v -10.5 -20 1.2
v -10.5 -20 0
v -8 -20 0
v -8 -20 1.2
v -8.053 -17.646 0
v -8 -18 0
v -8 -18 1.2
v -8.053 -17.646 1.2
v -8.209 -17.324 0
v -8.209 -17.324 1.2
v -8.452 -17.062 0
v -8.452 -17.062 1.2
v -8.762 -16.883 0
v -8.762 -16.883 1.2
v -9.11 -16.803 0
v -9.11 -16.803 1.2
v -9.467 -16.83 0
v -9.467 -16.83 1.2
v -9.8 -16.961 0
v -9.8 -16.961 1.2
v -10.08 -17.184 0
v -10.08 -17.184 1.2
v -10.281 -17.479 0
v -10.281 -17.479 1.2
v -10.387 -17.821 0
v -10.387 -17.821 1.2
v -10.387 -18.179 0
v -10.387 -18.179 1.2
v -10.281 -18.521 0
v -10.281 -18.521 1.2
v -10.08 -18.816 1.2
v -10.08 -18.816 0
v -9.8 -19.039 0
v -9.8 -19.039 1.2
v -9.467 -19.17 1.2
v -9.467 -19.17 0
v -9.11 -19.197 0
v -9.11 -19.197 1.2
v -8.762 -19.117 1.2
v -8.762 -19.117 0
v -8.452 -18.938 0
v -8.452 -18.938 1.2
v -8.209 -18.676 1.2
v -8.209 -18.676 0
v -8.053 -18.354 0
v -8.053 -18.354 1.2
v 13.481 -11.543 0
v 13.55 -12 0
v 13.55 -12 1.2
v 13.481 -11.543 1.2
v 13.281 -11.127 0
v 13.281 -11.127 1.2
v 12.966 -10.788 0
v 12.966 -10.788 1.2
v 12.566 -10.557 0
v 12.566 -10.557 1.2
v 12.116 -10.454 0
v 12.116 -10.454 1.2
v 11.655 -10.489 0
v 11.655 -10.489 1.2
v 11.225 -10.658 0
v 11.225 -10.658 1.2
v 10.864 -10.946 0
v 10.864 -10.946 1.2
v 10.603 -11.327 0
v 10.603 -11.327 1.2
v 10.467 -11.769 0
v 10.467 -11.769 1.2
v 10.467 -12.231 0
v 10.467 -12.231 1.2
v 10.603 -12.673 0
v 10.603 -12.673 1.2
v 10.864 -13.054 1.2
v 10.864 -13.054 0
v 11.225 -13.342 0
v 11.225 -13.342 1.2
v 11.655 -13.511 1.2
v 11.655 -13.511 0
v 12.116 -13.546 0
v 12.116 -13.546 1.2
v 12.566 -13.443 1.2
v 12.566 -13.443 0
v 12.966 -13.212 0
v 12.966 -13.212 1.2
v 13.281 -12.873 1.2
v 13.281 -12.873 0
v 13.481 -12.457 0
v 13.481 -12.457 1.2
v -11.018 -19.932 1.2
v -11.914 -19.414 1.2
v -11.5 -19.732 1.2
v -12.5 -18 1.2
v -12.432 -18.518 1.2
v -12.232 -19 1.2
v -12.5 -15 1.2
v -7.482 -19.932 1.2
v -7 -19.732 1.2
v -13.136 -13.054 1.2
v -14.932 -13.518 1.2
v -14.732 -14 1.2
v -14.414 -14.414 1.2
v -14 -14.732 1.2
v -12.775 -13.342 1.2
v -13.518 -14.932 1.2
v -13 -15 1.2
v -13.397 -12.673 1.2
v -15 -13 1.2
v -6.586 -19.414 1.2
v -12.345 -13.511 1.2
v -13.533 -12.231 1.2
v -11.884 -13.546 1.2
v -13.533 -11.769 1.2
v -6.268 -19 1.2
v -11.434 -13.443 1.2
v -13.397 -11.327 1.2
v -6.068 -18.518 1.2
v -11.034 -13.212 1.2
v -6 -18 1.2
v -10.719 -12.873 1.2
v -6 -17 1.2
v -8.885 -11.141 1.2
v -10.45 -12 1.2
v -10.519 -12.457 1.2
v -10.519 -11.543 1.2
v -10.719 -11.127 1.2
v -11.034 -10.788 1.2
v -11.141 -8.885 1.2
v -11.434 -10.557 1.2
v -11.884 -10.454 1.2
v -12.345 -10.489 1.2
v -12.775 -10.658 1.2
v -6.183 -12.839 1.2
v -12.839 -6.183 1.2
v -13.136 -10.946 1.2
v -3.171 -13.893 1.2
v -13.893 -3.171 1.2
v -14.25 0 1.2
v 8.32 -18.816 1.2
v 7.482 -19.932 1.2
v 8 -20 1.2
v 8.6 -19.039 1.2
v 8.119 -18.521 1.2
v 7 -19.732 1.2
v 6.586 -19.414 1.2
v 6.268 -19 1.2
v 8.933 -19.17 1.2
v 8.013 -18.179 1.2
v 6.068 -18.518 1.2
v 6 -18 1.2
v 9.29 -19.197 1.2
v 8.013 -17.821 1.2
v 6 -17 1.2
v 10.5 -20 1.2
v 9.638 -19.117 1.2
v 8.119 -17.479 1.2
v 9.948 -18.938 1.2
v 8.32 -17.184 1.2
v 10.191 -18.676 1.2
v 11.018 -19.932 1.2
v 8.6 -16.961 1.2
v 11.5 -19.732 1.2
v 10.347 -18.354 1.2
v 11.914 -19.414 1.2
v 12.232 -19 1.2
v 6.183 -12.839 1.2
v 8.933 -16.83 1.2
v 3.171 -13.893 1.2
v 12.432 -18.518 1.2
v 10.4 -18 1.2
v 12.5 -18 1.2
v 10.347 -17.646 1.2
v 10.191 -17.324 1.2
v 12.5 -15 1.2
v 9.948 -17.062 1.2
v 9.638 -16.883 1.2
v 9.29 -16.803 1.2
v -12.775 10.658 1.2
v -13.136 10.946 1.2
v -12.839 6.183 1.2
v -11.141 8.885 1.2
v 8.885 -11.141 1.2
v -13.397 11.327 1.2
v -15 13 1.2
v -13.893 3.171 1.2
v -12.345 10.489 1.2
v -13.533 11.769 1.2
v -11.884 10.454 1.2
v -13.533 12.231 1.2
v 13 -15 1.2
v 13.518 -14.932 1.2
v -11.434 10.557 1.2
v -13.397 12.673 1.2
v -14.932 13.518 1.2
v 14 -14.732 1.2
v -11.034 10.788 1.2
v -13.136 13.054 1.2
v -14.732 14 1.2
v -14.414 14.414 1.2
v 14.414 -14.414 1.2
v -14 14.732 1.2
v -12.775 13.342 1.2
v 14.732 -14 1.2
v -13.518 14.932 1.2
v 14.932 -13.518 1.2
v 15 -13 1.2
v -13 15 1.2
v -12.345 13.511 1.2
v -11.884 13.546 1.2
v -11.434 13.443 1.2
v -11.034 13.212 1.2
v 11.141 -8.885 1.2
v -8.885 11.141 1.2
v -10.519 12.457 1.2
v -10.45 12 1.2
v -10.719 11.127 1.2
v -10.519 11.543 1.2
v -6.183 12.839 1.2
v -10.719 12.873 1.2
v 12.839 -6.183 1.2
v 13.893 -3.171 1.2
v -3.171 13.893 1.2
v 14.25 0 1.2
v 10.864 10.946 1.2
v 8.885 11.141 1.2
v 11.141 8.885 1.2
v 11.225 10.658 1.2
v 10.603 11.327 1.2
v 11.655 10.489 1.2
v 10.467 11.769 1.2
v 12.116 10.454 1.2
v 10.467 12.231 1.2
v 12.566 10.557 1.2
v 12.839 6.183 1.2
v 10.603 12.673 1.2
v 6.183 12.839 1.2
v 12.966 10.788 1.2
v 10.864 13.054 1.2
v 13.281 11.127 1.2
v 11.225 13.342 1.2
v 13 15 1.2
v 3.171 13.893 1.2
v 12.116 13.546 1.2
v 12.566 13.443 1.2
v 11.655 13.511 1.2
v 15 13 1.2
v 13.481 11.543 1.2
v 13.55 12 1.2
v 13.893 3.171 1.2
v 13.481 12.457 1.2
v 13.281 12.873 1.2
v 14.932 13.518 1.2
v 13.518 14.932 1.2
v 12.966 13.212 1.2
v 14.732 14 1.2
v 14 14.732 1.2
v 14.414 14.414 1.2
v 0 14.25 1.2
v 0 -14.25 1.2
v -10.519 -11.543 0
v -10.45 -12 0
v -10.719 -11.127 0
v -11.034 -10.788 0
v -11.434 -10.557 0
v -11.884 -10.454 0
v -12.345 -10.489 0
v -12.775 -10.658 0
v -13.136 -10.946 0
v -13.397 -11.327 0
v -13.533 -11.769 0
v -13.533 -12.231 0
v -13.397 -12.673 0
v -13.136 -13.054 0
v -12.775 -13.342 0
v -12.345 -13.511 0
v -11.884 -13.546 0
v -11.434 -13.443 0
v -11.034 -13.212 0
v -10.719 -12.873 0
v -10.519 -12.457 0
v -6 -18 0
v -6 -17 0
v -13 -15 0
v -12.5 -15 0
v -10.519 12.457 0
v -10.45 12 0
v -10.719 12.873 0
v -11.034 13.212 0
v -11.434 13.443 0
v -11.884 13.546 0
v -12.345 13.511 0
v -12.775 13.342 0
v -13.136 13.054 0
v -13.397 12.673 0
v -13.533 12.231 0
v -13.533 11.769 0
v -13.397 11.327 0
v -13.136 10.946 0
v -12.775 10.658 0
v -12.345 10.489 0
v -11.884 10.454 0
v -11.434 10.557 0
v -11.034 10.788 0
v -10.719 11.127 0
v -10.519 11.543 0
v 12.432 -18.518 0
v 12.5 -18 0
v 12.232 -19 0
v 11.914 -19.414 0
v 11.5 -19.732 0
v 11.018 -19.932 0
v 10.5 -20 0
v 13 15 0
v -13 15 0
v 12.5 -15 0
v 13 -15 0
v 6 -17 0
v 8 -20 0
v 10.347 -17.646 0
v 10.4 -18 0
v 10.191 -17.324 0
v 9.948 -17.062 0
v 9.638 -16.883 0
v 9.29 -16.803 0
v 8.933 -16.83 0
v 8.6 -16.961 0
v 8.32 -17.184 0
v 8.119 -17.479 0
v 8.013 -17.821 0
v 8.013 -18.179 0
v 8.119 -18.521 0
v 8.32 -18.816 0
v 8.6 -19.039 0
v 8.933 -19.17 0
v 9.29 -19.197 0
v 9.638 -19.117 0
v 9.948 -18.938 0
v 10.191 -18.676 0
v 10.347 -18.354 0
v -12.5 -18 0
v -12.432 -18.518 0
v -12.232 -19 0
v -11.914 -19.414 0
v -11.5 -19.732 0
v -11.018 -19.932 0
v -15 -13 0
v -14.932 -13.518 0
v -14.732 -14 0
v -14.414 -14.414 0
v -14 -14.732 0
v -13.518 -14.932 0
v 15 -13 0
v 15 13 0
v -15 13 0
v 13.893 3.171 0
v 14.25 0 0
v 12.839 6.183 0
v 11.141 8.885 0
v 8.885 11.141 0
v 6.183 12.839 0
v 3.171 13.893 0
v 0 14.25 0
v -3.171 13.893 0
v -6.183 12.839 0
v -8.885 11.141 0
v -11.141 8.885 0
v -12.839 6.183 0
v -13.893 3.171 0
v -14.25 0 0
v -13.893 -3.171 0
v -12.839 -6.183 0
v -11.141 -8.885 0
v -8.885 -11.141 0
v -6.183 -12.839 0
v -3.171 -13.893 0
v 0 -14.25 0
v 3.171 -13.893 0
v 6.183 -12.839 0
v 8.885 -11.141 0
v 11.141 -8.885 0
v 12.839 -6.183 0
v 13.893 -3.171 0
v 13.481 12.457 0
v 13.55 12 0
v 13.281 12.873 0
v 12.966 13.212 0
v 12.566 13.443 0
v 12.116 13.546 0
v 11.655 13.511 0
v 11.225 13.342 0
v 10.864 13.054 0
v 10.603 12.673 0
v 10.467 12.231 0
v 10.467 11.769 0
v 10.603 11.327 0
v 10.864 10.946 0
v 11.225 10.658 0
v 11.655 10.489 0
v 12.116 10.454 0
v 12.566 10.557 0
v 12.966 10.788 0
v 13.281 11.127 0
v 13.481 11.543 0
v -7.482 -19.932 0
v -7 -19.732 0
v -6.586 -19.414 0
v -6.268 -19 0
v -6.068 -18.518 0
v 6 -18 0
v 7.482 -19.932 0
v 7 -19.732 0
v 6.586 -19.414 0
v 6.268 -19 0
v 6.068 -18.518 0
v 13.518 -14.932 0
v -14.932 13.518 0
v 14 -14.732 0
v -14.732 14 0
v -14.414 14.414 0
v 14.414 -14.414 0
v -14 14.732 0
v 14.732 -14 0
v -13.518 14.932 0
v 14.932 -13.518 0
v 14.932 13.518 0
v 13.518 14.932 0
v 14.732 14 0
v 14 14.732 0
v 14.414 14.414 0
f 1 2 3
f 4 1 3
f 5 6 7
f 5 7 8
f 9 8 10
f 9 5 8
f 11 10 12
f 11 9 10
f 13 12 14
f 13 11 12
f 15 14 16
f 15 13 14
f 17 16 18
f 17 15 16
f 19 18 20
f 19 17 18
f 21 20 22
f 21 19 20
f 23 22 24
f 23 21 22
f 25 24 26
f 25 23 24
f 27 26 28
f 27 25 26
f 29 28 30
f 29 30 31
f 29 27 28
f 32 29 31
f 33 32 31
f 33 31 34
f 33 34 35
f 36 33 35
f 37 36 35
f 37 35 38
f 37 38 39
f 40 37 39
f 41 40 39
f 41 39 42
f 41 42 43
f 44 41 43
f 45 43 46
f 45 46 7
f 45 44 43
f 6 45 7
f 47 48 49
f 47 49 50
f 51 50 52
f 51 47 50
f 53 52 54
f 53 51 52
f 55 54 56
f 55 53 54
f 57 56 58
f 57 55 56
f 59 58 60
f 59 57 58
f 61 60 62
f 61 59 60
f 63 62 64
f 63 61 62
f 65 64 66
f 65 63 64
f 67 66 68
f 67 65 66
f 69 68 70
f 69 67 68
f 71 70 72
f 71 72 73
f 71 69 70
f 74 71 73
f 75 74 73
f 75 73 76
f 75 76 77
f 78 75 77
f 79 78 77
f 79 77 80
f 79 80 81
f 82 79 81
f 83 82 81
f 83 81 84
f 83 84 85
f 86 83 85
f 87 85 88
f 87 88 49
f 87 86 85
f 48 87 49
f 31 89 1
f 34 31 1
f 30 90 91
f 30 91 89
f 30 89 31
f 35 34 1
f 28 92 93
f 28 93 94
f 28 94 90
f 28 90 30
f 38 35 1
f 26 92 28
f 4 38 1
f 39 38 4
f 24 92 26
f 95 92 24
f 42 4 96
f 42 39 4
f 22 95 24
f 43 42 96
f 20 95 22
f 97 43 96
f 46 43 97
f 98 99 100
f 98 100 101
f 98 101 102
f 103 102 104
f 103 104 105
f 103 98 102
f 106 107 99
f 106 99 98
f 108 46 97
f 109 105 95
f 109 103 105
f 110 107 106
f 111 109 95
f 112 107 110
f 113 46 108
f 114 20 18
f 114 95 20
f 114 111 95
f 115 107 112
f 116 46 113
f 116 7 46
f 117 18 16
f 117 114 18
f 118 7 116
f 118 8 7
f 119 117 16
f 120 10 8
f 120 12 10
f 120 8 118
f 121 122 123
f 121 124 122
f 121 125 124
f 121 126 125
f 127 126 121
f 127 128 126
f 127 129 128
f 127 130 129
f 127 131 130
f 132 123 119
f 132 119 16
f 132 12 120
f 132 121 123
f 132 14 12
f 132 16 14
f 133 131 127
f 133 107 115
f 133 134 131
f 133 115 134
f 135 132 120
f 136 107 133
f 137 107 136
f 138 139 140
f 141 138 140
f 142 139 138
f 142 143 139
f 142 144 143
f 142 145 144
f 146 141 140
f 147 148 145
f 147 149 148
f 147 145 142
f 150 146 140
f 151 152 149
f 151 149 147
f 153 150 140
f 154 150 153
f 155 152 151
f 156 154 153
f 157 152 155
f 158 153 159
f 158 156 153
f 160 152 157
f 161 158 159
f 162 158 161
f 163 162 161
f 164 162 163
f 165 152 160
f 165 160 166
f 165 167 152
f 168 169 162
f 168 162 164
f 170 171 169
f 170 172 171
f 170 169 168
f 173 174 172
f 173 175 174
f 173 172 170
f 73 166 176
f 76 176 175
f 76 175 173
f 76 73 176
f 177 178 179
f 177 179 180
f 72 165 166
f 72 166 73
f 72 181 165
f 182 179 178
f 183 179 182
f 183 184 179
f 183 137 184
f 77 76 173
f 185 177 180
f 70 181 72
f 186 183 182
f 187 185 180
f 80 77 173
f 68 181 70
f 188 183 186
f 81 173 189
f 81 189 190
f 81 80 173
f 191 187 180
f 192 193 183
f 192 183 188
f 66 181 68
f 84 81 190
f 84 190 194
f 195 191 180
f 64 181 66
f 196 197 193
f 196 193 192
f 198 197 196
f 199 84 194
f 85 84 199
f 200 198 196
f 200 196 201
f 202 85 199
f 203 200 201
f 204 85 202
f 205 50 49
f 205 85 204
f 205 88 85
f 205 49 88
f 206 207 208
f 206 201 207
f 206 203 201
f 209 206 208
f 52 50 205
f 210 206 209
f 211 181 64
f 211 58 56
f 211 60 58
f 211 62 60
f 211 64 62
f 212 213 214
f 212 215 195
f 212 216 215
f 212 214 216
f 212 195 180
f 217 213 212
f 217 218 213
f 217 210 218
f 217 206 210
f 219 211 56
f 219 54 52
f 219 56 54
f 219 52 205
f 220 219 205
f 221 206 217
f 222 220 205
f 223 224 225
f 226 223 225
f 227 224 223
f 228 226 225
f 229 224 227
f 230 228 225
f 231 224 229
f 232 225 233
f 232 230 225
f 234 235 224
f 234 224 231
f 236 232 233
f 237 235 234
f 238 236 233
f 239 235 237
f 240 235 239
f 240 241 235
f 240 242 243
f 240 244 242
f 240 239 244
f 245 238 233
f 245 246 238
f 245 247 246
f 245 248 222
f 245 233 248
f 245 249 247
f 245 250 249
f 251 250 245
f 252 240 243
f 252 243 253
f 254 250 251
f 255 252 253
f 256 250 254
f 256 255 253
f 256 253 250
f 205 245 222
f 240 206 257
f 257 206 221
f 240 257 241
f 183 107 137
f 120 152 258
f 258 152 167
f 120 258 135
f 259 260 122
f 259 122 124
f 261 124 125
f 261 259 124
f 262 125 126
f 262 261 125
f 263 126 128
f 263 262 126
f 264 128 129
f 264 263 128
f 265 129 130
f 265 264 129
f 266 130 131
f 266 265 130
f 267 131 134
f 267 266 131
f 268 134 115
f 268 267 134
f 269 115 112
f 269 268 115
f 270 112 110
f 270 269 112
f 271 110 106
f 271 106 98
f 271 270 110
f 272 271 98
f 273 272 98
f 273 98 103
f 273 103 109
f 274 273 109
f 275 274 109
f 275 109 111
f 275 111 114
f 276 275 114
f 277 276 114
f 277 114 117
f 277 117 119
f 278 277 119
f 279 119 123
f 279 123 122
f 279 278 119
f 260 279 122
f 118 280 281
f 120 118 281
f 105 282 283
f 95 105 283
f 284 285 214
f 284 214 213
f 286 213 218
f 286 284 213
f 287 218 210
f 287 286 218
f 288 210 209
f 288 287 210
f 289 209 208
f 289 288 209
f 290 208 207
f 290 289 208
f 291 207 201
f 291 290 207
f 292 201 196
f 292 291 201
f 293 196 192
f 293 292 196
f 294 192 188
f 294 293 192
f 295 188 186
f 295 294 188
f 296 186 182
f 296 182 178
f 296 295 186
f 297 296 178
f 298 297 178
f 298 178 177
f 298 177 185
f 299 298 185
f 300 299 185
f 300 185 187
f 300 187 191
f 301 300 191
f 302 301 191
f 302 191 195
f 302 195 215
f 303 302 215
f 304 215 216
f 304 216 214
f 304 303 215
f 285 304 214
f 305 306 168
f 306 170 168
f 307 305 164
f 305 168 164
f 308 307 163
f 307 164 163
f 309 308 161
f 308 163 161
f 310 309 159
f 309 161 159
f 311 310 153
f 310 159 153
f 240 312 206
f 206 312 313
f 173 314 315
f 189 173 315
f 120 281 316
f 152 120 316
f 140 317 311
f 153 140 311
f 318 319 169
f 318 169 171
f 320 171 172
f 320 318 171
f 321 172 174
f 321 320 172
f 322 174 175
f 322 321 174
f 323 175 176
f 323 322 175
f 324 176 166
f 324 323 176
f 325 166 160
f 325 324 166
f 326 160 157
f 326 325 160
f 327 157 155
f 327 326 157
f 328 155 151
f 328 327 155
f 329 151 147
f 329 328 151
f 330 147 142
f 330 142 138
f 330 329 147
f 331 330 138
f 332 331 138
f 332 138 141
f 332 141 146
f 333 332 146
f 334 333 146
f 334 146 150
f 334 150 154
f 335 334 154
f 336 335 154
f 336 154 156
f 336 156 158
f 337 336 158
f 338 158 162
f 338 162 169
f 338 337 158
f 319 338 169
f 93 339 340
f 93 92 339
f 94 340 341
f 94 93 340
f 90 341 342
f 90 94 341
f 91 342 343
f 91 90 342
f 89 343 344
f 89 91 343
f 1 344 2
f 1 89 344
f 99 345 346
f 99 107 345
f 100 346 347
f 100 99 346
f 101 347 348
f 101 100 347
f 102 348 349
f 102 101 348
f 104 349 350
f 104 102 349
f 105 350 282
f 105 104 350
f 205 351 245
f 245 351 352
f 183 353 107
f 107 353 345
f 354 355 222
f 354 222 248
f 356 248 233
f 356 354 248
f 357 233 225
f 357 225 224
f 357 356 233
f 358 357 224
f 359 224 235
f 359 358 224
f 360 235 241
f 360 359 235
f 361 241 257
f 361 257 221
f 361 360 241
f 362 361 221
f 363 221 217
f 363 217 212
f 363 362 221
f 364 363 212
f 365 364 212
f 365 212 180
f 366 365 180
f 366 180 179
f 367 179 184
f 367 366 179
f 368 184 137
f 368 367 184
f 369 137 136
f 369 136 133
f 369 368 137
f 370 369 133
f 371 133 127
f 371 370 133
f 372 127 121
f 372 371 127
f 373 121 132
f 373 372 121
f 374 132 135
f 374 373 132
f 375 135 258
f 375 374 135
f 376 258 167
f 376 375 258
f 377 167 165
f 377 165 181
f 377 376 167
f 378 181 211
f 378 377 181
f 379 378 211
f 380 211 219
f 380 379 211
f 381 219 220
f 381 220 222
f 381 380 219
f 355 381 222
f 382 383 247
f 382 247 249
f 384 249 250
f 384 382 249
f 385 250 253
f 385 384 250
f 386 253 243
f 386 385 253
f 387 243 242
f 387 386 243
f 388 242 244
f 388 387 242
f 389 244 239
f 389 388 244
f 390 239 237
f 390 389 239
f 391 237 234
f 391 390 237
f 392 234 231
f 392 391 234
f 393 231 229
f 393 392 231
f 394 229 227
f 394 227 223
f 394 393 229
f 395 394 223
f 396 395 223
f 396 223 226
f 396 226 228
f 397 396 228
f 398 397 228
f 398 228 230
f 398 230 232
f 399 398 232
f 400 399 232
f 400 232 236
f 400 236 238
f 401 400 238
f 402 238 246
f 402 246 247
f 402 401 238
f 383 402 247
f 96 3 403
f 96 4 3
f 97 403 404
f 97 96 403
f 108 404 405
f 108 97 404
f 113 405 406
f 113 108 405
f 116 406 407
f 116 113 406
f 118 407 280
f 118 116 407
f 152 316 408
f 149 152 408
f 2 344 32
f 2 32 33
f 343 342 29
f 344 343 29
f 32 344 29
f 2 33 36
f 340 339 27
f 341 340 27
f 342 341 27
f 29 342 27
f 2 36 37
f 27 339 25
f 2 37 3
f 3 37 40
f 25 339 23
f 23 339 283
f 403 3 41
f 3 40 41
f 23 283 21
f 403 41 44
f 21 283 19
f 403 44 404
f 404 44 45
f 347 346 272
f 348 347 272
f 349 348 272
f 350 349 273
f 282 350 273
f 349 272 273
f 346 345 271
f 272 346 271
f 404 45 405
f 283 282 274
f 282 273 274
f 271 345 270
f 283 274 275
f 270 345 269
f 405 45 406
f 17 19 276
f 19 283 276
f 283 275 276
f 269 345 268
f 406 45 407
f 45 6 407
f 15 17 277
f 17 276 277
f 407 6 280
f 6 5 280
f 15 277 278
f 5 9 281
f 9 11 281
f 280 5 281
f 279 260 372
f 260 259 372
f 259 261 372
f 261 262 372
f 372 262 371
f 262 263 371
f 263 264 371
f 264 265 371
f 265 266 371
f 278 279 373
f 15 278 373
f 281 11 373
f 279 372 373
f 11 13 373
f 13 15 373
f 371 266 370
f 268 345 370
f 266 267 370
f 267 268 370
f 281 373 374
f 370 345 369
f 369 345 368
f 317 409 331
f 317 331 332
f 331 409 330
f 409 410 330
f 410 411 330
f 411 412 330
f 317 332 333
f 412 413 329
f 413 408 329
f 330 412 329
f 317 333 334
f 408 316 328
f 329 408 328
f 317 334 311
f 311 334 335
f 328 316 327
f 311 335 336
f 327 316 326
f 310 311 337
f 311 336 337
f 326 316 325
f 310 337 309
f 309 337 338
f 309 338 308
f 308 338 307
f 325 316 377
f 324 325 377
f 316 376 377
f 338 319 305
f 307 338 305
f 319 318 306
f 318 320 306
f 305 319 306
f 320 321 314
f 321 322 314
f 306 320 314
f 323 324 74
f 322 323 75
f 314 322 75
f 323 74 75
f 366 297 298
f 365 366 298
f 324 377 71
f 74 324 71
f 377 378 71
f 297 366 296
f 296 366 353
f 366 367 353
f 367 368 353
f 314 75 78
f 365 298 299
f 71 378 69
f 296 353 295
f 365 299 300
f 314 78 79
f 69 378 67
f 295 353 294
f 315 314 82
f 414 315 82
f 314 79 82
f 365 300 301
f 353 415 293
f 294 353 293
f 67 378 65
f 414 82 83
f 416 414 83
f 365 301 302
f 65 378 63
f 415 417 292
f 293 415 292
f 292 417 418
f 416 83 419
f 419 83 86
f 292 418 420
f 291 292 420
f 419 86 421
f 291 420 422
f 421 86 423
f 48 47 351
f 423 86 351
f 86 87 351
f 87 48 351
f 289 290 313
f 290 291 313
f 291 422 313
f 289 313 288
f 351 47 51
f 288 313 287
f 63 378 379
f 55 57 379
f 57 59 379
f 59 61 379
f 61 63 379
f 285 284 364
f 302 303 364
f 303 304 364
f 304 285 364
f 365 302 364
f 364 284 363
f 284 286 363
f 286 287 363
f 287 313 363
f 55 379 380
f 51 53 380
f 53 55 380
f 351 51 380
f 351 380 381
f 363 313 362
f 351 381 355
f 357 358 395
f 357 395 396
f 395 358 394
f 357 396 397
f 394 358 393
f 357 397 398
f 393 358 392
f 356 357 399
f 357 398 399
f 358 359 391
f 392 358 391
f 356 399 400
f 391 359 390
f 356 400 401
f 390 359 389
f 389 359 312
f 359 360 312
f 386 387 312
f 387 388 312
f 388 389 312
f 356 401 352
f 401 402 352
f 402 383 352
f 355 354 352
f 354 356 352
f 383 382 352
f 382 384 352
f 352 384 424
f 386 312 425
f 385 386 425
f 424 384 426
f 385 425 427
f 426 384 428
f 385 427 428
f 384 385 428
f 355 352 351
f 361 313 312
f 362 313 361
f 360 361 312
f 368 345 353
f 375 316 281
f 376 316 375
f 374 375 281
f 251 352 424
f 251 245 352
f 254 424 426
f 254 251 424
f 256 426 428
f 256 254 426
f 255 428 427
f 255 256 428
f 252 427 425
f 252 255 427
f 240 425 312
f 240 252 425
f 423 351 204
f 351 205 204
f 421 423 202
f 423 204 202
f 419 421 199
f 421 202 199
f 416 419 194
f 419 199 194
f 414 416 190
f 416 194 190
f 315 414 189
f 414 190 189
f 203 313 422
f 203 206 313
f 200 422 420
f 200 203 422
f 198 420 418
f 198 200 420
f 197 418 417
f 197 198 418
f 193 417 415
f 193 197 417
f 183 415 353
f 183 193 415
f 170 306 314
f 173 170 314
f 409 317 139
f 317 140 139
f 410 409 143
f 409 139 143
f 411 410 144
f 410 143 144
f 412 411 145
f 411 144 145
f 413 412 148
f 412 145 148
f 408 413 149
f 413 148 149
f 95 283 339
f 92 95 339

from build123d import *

# Parameters (mm, degrees)
F0_R     = 1.55
F0_R_2   = 14.25
F0_R_3   = 1.2
F0_W     = 12
F0_H     = 2
F1_DEPTH = 1.2
F2_R     = 2


with BuildPart() as f1:
    # F0 (on Top) → F1 (new body)
    with BuildSketch(Plane.XY):
        Polygon((12.5, -15), (15, -15), (15, 15), (-15, 15), (-15, -15), (-12.5, -15), (-6, -15), (6, -15), align=None)
        with Locations((-12, -12)):
            Circle(F0_R, mode=Mode.SUBTRACT)
        with Locations((12, -12)):
            Circle(F0_R, mode=Mode.SUBTRACT)
        with Locations((-12, 12)):
            Circle(F0_R, mode=Mode.SUBTRACT)
        Circle(F0_R_2, mode=Mode.SUBTRACT)
        with Locations((12, 12)):
            Circle(F0_R, mode=Mode.SUBTRACT)
        Polygon((-6, -17), (-6, -15), (-12.5, -15), (-12.5, -20), (-6, -20), align=None)
        with Locations((-9.2, -18)):
            Circle(F0_R_3, mode=Mode.SUBTRACT)
        with Locations((0, -16)):
            Rectangle(F0_W, F0_H)
        Polygon((12.5, -20), (12.5, -15), (6, -15), (6, -17), (6, -20), align=None)
        with Locations((9.2, -18)):
            Circle(F0_R_3, mode=Mode.SUBTRACT)
    extrude(amount=F1_DEPTH)

    # F2
    f2_edges = [f1.edges().sort_by_distance(p)[0] for p in [
        (15, -15, 0.6),
        (-15, -15, 0.6),
        (-15, 15, 0.6),
        (15, 15, 0.6),
        (-12.5, -20, 0.6),
        (-6, -20, 0.6),
        (6, -20, 0.6),
        (12.5, -20, 0.6),
    ]]
    fillet(f2_edges, radius=F2_R)


solid = f1.part
